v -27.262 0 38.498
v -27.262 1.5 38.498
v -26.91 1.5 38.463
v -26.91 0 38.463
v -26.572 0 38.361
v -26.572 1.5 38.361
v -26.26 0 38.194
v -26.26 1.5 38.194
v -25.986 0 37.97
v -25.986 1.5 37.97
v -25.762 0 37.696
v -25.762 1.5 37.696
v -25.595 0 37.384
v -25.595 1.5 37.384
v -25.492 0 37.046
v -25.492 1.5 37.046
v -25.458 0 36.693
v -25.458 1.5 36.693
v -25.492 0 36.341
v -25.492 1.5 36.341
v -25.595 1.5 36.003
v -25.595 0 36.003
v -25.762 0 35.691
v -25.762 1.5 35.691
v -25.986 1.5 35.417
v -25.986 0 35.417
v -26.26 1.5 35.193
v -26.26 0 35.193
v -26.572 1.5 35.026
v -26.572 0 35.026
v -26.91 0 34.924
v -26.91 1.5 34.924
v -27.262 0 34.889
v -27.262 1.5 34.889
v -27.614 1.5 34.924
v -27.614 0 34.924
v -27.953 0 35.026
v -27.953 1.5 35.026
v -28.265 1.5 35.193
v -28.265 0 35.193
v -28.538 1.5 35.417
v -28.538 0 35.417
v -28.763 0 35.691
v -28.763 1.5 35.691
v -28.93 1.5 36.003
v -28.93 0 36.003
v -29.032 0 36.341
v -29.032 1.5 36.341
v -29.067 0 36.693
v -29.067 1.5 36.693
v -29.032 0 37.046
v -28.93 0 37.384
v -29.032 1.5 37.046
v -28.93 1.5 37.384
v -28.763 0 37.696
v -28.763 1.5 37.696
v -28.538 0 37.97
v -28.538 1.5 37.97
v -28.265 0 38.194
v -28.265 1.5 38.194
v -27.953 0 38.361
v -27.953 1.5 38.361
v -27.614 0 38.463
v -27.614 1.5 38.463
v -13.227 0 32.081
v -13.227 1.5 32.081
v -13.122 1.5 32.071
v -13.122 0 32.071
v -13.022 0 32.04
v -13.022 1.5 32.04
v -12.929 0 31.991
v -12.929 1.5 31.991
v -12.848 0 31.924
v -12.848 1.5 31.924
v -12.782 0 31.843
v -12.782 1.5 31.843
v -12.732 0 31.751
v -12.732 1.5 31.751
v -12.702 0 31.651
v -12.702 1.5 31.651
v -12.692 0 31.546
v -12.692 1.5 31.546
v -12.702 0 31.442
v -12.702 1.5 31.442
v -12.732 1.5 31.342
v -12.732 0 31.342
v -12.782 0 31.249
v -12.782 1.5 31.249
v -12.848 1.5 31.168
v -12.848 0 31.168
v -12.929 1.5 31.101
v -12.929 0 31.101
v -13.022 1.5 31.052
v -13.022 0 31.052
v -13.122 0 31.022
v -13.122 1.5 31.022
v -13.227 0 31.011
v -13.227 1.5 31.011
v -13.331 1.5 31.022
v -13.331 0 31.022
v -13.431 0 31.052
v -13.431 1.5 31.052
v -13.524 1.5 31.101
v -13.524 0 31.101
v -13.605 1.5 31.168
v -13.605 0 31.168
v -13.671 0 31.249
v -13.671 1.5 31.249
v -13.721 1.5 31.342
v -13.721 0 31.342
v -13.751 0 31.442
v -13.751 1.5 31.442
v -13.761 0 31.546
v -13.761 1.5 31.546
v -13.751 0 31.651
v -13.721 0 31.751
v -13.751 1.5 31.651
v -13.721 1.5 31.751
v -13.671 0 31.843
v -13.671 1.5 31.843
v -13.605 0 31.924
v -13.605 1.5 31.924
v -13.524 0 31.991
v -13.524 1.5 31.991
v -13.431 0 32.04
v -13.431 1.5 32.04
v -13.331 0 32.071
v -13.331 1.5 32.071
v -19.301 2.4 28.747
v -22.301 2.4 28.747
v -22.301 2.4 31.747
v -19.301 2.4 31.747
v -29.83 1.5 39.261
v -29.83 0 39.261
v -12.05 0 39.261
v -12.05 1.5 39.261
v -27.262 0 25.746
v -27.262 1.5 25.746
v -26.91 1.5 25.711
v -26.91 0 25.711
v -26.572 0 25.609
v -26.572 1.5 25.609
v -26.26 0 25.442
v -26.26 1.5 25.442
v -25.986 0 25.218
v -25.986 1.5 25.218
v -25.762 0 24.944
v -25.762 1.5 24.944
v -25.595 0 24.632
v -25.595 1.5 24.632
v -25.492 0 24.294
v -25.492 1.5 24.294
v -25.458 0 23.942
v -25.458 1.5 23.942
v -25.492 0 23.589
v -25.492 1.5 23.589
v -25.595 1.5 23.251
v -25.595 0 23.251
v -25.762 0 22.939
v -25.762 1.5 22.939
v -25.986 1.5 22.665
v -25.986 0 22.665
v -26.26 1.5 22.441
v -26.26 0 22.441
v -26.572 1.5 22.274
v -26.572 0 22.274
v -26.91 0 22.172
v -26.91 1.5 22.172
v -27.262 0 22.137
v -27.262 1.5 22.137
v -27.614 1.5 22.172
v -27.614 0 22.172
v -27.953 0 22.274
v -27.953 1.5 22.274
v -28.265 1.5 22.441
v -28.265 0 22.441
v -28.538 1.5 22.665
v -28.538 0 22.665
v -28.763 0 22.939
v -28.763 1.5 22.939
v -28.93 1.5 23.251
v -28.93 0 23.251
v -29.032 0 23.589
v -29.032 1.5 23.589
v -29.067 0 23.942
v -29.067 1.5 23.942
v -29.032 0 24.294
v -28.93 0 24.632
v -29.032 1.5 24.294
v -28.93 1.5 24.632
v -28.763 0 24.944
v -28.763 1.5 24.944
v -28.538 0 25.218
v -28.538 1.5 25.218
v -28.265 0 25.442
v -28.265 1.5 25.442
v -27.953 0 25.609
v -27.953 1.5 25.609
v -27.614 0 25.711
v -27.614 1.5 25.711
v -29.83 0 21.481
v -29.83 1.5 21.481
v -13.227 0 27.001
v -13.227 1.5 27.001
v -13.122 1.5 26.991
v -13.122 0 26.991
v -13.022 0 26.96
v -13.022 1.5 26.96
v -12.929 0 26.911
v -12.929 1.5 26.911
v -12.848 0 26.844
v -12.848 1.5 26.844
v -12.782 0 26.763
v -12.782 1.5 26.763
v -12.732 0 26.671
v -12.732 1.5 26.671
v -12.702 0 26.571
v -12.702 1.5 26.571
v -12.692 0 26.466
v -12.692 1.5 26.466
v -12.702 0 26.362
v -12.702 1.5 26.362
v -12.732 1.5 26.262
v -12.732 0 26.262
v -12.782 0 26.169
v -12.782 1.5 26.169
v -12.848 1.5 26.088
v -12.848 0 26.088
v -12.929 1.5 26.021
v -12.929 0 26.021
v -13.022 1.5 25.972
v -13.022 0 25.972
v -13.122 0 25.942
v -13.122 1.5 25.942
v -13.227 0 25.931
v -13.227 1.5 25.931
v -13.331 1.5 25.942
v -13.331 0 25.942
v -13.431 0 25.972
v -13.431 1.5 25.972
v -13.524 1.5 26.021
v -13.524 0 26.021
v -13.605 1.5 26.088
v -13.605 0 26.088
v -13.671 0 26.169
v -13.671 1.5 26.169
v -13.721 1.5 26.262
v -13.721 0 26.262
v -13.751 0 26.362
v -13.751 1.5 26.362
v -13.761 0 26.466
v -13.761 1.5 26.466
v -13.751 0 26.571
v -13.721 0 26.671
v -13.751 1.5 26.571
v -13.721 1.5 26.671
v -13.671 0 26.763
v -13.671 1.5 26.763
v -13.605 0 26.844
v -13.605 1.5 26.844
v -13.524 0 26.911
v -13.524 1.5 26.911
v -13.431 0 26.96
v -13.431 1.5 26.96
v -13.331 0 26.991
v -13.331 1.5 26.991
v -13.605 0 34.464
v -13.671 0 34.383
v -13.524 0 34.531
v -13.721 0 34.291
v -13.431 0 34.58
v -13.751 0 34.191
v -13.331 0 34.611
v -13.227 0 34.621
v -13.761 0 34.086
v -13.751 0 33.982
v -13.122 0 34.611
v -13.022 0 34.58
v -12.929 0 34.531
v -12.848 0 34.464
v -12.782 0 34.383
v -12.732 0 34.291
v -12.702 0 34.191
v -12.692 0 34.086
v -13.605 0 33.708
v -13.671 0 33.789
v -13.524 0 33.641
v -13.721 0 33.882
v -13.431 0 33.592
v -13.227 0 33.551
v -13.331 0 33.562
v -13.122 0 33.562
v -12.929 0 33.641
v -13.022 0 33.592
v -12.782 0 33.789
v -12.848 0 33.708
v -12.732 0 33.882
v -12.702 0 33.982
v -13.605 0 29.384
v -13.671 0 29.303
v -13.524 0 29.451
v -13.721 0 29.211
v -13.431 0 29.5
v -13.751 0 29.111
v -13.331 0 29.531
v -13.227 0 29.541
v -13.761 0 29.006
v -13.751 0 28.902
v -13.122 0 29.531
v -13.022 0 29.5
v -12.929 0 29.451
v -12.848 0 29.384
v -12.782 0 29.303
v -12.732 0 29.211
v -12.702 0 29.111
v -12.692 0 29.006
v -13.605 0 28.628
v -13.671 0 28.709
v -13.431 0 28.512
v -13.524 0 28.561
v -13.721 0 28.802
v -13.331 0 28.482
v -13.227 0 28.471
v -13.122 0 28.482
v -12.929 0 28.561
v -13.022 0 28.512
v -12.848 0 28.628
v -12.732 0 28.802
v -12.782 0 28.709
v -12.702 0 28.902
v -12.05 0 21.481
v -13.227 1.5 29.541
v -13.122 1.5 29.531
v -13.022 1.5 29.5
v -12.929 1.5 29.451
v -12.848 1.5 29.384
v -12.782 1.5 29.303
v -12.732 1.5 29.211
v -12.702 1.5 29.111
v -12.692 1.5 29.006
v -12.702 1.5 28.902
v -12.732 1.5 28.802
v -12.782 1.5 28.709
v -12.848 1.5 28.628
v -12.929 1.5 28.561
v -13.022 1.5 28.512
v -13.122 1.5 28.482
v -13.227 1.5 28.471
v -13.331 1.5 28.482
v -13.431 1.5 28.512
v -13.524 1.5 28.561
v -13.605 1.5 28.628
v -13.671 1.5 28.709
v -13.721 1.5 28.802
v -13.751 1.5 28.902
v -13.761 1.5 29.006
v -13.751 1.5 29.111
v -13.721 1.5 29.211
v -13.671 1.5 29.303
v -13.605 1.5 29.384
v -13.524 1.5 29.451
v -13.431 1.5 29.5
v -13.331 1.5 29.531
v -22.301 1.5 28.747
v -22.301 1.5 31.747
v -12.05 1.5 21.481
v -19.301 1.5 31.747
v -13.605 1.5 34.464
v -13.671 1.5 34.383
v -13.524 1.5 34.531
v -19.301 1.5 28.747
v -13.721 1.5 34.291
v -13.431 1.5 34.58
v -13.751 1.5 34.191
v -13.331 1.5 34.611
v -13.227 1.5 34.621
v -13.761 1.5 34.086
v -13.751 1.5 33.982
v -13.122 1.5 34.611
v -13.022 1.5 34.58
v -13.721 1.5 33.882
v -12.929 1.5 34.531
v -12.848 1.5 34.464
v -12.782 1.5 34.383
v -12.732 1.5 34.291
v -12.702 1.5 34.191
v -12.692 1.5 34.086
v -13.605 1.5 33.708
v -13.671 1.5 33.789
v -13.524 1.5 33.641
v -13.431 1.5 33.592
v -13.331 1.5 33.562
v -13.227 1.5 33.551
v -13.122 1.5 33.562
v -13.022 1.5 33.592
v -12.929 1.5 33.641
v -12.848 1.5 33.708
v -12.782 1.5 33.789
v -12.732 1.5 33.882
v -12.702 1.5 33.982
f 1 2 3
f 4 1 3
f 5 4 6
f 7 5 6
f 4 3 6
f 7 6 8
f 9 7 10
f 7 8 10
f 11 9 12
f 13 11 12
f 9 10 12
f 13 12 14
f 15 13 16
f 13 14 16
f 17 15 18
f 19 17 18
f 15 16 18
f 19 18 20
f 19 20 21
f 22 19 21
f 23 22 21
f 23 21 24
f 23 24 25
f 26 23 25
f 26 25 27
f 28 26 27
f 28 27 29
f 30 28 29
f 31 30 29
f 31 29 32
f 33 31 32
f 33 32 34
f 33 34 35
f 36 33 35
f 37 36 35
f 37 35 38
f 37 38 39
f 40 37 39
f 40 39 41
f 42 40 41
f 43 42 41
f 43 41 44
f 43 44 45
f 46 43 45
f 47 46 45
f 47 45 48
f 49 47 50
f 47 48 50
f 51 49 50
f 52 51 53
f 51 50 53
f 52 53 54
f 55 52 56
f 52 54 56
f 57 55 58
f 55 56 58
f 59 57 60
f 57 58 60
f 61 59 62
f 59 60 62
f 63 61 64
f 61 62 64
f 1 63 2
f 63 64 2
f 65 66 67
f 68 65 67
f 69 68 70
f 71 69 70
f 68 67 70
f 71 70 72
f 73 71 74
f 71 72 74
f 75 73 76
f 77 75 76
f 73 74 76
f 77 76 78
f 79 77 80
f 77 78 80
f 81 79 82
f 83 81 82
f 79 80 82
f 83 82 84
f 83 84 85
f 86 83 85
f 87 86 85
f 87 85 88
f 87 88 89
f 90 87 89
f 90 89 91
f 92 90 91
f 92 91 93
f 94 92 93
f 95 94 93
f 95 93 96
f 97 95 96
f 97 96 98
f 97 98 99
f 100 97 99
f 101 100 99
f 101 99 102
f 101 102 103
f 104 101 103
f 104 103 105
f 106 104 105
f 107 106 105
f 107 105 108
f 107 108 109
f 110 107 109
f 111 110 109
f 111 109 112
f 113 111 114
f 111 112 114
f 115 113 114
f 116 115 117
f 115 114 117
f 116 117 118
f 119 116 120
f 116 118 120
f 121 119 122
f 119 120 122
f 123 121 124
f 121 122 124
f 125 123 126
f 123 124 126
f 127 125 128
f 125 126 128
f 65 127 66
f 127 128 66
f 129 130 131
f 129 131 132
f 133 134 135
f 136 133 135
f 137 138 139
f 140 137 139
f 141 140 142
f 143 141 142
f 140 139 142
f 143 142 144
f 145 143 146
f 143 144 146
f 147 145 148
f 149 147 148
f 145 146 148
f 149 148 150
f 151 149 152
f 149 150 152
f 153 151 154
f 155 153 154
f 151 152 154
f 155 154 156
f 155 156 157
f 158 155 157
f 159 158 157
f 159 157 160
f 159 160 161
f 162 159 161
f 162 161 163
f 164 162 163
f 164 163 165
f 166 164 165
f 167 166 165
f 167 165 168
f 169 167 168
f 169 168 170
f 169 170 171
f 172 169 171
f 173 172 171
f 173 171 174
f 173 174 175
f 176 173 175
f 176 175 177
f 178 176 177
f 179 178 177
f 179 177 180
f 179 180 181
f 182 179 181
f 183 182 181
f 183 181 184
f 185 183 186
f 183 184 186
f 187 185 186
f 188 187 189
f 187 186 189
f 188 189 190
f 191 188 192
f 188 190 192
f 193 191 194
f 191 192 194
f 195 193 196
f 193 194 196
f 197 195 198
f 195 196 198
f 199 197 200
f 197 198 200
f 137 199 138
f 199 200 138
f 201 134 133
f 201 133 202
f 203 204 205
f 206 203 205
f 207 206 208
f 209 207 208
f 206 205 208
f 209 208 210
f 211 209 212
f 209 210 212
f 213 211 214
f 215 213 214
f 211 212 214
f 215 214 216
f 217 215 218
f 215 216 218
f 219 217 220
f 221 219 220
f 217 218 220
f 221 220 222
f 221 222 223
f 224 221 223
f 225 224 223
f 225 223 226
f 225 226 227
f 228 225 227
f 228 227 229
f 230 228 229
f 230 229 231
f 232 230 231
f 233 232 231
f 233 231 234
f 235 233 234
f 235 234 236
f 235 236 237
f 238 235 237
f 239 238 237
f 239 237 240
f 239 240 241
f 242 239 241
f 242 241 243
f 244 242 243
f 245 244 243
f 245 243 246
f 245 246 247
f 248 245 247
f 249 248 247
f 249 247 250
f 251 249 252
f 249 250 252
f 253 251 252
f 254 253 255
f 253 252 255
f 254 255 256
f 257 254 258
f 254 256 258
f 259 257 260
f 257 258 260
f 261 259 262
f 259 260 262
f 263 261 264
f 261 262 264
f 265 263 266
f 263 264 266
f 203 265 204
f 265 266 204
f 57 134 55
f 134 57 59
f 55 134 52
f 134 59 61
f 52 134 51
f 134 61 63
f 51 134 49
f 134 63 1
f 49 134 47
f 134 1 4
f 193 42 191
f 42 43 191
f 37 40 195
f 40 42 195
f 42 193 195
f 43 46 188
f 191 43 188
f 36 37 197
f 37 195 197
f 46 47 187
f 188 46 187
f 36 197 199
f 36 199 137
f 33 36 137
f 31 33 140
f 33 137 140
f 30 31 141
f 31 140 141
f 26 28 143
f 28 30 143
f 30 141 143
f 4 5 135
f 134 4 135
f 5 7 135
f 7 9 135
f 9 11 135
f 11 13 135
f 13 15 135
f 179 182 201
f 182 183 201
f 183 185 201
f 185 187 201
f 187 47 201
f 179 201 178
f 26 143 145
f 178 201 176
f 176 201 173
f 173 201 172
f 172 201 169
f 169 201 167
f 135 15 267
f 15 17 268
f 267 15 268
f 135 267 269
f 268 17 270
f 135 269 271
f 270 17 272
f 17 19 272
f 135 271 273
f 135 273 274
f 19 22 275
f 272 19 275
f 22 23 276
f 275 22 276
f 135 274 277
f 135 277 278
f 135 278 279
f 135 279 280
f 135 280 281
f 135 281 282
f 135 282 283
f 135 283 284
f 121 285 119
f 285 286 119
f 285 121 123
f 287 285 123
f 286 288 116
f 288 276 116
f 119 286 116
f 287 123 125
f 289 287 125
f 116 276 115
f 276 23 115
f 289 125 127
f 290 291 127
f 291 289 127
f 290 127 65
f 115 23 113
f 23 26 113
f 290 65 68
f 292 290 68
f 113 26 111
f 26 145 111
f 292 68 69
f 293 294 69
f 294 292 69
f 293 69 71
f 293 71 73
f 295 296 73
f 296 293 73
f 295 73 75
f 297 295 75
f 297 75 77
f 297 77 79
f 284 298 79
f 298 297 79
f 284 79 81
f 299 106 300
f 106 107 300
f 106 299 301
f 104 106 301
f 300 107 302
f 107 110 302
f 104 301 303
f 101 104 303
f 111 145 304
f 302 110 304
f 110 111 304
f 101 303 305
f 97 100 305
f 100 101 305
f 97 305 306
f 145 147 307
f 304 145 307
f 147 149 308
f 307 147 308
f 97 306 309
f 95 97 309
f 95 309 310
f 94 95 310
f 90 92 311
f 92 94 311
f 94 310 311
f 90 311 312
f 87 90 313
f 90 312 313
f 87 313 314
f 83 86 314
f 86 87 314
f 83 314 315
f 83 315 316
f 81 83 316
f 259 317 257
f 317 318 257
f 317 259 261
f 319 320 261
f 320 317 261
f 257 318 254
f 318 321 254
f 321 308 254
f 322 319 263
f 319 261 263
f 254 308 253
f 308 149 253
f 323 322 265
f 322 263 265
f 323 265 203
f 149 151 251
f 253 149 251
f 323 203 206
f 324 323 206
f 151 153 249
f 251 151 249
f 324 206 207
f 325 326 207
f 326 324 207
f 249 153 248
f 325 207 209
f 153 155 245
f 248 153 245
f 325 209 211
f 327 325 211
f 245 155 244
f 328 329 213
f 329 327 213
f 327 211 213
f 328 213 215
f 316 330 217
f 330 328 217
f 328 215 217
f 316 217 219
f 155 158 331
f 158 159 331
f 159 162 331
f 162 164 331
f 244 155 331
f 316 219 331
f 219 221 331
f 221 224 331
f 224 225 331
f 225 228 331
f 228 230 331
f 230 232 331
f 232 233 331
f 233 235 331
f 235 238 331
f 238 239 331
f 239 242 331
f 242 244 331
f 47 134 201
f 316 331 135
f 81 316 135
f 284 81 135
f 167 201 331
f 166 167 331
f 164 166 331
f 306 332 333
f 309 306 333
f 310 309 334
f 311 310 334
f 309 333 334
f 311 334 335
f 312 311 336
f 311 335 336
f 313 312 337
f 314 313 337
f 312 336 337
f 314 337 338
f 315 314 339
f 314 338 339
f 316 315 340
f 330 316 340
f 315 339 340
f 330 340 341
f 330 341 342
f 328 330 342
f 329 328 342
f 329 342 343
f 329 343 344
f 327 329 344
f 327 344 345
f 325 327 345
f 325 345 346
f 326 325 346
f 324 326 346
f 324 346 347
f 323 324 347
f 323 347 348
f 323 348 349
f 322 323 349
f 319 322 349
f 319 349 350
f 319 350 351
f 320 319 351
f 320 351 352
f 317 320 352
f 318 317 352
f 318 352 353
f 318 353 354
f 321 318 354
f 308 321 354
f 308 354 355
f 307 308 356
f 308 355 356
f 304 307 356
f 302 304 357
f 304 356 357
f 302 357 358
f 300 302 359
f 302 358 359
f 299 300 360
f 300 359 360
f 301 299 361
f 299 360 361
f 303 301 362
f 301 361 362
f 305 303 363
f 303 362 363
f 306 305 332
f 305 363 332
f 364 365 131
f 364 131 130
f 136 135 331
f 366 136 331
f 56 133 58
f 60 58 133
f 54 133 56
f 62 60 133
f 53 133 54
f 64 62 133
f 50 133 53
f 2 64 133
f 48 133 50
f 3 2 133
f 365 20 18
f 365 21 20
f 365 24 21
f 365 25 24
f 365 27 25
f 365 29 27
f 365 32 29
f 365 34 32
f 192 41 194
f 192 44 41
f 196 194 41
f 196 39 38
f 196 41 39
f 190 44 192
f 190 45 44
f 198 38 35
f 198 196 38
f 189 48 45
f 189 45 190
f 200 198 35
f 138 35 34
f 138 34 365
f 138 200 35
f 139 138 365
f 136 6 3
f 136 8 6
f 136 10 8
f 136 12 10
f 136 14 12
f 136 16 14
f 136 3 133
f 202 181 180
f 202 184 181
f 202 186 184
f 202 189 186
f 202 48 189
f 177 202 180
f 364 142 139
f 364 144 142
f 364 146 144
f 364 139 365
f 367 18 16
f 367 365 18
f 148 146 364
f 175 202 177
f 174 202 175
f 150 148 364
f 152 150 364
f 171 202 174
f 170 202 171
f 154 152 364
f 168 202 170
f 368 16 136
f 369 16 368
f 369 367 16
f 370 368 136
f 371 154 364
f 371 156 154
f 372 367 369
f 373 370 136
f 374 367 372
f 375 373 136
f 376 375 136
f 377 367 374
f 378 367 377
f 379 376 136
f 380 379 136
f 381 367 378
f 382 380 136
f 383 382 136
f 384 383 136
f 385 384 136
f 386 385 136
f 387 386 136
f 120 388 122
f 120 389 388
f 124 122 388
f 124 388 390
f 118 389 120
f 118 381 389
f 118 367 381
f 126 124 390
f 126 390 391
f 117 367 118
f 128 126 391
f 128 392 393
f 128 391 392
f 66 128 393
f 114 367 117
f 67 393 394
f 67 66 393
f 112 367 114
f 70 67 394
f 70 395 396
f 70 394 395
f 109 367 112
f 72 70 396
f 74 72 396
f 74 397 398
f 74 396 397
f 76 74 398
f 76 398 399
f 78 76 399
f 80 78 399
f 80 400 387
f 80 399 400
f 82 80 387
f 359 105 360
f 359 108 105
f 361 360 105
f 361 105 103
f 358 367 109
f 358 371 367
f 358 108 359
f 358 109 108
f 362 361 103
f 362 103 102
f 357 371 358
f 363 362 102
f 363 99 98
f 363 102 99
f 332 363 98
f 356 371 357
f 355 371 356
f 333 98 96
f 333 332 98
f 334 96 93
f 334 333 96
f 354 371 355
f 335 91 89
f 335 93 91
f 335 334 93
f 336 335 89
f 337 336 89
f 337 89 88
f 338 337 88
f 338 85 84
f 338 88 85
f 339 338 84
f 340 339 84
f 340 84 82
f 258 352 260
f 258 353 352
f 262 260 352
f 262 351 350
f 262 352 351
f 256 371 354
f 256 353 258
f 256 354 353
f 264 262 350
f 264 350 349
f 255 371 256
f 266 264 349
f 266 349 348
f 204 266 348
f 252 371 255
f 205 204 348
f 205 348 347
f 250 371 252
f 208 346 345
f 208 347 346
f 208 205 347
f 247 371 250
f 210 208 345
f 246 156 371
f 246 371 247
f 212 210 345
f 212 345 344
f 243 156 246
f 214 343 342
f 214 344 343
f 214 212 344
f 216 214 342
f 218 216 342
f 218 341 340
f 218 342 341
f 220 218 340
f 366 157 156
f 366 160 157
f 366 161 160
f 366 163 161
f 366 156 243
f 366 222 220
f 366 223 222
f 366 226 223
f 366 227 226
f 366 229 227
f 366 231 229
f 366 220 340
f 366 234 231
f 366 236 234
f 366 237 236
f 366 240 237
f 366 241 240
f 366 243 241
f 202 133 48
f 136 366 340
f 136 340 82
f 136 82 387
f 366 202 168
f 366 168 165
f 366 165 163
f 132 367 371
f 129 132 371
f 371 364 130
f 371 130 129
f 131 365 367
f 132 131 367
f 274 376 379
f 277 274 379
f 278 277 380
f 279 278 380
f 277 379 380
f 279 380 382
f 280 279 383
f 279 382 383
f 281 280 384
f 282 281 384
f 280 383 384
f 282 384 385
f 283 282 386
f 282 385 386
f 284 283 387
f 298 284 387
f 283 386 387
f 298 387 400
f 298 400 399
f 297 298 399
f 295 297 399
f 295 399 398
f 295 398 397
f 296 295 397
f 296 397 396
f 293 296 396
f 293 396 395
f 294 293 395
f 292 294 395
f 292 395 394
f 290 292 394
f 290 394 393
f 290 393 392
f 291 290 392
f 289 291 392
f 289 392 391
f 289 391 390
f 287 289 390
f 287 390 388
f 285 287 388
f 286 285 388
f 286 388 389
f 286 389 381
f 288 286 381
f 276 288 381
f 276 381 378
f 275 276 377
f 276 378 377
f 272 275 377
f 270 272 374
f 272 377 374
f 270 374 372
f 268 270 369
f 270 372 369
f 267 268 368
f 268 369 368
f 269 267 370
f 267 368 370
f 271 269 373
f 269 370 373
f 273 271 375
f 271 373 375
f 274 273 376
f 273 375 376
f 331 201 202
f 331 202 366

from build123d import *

# Parameters (mm, degrees)
SKETCH1_W           = 17.78
SKETCH1_H           = 17.78
BOSS_EXTRUDE1_DEPTH = 1.5
CUT_EXTRUDE1_REACH  = 51.33
SKETCH2_R           = 1.804631731
SKETCH2_R_2         = 0.534898854
SKETCH3_W           = 3
SKETCH3_H           = 3
BOSS_EXTRUDE2_DEPTH = 0.9


with BuildPart() as part:
    # Sketch1 → Boss-Extrude1 (new body)
    with BuildSketch(Plane(origin=(0, 0, 0), x_dir=(1, 0, 0), z_dir=(0, 1, 0))):
        with Locations((-20.939781645, -30.370993212)):
            Rectangle(SKETCH1_W, SKETCH1_H)
    extrude(amount=BOSS_EXTRUDE1_DEPTH)

    # Sketch2 → Cut-Extrude1 (cut, up to next)
    with BuildSketch(Plane(origin=(0, 1.5, 0), x_dir=(1, 0, 0), z_dir=(0, 1, 0)), mode=Mode.PRIVATE) as cut_extrude1_sk1:
        with Locations(Location((-27.262286101, -23.941508984, 0), (0, 0, 270))):
            Circle(SKETCH2_R)
    cut_extrude1_tool1 = extrude(cut_extrude1_sk1.sketch, amount=-CUT_EXTRUDE1_REACH, mode=Mode.PRIVATE) & part.part
    # Sketch2 → Cut-Extrude1 (cut, up to next)
    with BuildSketch(Plane(origin=(0, 1.5, 0), x_dir=(1, 0, 0), z_dir=(0, 1, 0)), mode=Mode.PRIVATE) as cut_extrude1_sk2:
        with Locations(Location((-27.262286101, -36.693497669, 0), (0, 0, 270))):
            Circle(SKETCH2_R)
    cut_extrude1_tool2 = extrude(cut_extrude1_sk2.sketch, amount=-CUT_EXTRUDE1_REACH, mode=Mode.PRIVATE) & part.part
    # Sketch2 → Cut-Extrude1 (cut, up to next)
    with BuildSketch(Plane(origin=(0, 1.5, 0), x_dir=(1, 0, 0), z_dir=(0, 1, 0)), mode=Mode.PRIVATE) as cut_extrude1_sk3:
        with Locations(Location((-13.226540167, -26.466231576, 0), (0, 0, 270))):
            Circle(SKETCH2_R_2)
    cut_extrude1_tool3 = extrude(cut_extrude1_sk3.sketch, amount=-CUT_EXTRUDE1_REACH, mode=Mode.PRIVATE) & part.part
    # Sketch2 → Cut-Extrude1 (cut, up to next)
    with BuildSketch(Plane(origin=(0, 1.5, 0), x_dir=(1, 0, 0), z_dir=(0, 1, 0)), mode=Mode.PRIVATE) as cut_extrude1_sk4:
        with Locations(Location((-13.226540167, -29.006231576, 0), (0, 0, 270))):
            Circle(SKETCH2_R_2)
    cut_extrude1_tool4 = extrude(cut_extrude1_sk4.sketch, amount=-CUT_EXTRUDE1_REACH, mode=Mode.PRIVATE) & part.part
    # Sketch2 → Cut-Extrude1 (cut, up to next)
    with BuildSketch(Plane(origin=(0, 1.5, 0), x_dir=(1, 0, 0), z_dir=(0, 1, 0)), mode=Mode.PRIVATE) as cut_extrude1_sk5:
        with Locations(Location((-13.226540167, -31.546231576, 0), (0, 0, 270))):
            Circle(SKETCH2_R_2)
    cut_extrude1_tool5 = extrude(cut_extrude1_sk5.sketch, amount=-CUT_EXTRUDE1_REACH, mode=Mode.PRIVATE) & part.part
    # Sketch2 → Cut-Extrude1 (cut, up to next)
    with BuildSketch(Plane(origin=(0, 1.5, 0), x_dir=(1, 0, 0), z_dir=(0, 1, 0)), mode=Mode.PRIVATE) as cut_extrude1_sk6:
        with Locations(Location((-13.226540167, -34.086231576, 0), (0, 0, 270))):
            Circle(SKETCH2_R_2)
    cut_extrude1_tool6 = extrude(cut_extrude1_sk6.sketch, amount=-CUT_EXTRUDE1_REACH, mode=Mode.PRIVATE) & part.part
    add(cut_extrude1_tool1.solids().sort_by_distance((-27.262286, 1.5, 23.941509))[0], mode=Mode.SUBTRACT)
    add(cut_extrude1_tool2.solids().sort_by_distance((-27.262286, 1.5, 36.693498))[0], mode=Mode.SUBTRACT)
    add(cut_extrude1_tool3.solids().sort_by_distance((-13.22654, 1.5, 26.466232))[0], mode=Mode.SUBTRACT)
    add(cut_extrude1_tool4.solids().sort_by_distance((-13.22654, 1.5, 29.006232))[0], mode=Mode.SUBTRACT)
    add(cut_extrude1_tool5.solids().sort_by_distance((-13.22654, 1.5, 31.546232))[0], mode=Mode.SUBTRACT)
    add(cut_extrude1_tool6.solids().sort_by_distance((-13.22654, 1.5, 34.086232))[0], mode=Mode.SUBTRACT)

    # Sketch3 → Boss-Extrude2 (add)
    with BuildSketch(Plane(origin=(0, 1.5, 0), x_dir=(1, 0, 0), z_dir=(0, 1, 0))):
        with Locations((-20.801462442, -30.247030068)):
            Rectangle(SKETCH3_W, SKETCH3_H)
    extrude(amount=BOSS_EXTRUDE2_DEPTH)


solid = part.part
